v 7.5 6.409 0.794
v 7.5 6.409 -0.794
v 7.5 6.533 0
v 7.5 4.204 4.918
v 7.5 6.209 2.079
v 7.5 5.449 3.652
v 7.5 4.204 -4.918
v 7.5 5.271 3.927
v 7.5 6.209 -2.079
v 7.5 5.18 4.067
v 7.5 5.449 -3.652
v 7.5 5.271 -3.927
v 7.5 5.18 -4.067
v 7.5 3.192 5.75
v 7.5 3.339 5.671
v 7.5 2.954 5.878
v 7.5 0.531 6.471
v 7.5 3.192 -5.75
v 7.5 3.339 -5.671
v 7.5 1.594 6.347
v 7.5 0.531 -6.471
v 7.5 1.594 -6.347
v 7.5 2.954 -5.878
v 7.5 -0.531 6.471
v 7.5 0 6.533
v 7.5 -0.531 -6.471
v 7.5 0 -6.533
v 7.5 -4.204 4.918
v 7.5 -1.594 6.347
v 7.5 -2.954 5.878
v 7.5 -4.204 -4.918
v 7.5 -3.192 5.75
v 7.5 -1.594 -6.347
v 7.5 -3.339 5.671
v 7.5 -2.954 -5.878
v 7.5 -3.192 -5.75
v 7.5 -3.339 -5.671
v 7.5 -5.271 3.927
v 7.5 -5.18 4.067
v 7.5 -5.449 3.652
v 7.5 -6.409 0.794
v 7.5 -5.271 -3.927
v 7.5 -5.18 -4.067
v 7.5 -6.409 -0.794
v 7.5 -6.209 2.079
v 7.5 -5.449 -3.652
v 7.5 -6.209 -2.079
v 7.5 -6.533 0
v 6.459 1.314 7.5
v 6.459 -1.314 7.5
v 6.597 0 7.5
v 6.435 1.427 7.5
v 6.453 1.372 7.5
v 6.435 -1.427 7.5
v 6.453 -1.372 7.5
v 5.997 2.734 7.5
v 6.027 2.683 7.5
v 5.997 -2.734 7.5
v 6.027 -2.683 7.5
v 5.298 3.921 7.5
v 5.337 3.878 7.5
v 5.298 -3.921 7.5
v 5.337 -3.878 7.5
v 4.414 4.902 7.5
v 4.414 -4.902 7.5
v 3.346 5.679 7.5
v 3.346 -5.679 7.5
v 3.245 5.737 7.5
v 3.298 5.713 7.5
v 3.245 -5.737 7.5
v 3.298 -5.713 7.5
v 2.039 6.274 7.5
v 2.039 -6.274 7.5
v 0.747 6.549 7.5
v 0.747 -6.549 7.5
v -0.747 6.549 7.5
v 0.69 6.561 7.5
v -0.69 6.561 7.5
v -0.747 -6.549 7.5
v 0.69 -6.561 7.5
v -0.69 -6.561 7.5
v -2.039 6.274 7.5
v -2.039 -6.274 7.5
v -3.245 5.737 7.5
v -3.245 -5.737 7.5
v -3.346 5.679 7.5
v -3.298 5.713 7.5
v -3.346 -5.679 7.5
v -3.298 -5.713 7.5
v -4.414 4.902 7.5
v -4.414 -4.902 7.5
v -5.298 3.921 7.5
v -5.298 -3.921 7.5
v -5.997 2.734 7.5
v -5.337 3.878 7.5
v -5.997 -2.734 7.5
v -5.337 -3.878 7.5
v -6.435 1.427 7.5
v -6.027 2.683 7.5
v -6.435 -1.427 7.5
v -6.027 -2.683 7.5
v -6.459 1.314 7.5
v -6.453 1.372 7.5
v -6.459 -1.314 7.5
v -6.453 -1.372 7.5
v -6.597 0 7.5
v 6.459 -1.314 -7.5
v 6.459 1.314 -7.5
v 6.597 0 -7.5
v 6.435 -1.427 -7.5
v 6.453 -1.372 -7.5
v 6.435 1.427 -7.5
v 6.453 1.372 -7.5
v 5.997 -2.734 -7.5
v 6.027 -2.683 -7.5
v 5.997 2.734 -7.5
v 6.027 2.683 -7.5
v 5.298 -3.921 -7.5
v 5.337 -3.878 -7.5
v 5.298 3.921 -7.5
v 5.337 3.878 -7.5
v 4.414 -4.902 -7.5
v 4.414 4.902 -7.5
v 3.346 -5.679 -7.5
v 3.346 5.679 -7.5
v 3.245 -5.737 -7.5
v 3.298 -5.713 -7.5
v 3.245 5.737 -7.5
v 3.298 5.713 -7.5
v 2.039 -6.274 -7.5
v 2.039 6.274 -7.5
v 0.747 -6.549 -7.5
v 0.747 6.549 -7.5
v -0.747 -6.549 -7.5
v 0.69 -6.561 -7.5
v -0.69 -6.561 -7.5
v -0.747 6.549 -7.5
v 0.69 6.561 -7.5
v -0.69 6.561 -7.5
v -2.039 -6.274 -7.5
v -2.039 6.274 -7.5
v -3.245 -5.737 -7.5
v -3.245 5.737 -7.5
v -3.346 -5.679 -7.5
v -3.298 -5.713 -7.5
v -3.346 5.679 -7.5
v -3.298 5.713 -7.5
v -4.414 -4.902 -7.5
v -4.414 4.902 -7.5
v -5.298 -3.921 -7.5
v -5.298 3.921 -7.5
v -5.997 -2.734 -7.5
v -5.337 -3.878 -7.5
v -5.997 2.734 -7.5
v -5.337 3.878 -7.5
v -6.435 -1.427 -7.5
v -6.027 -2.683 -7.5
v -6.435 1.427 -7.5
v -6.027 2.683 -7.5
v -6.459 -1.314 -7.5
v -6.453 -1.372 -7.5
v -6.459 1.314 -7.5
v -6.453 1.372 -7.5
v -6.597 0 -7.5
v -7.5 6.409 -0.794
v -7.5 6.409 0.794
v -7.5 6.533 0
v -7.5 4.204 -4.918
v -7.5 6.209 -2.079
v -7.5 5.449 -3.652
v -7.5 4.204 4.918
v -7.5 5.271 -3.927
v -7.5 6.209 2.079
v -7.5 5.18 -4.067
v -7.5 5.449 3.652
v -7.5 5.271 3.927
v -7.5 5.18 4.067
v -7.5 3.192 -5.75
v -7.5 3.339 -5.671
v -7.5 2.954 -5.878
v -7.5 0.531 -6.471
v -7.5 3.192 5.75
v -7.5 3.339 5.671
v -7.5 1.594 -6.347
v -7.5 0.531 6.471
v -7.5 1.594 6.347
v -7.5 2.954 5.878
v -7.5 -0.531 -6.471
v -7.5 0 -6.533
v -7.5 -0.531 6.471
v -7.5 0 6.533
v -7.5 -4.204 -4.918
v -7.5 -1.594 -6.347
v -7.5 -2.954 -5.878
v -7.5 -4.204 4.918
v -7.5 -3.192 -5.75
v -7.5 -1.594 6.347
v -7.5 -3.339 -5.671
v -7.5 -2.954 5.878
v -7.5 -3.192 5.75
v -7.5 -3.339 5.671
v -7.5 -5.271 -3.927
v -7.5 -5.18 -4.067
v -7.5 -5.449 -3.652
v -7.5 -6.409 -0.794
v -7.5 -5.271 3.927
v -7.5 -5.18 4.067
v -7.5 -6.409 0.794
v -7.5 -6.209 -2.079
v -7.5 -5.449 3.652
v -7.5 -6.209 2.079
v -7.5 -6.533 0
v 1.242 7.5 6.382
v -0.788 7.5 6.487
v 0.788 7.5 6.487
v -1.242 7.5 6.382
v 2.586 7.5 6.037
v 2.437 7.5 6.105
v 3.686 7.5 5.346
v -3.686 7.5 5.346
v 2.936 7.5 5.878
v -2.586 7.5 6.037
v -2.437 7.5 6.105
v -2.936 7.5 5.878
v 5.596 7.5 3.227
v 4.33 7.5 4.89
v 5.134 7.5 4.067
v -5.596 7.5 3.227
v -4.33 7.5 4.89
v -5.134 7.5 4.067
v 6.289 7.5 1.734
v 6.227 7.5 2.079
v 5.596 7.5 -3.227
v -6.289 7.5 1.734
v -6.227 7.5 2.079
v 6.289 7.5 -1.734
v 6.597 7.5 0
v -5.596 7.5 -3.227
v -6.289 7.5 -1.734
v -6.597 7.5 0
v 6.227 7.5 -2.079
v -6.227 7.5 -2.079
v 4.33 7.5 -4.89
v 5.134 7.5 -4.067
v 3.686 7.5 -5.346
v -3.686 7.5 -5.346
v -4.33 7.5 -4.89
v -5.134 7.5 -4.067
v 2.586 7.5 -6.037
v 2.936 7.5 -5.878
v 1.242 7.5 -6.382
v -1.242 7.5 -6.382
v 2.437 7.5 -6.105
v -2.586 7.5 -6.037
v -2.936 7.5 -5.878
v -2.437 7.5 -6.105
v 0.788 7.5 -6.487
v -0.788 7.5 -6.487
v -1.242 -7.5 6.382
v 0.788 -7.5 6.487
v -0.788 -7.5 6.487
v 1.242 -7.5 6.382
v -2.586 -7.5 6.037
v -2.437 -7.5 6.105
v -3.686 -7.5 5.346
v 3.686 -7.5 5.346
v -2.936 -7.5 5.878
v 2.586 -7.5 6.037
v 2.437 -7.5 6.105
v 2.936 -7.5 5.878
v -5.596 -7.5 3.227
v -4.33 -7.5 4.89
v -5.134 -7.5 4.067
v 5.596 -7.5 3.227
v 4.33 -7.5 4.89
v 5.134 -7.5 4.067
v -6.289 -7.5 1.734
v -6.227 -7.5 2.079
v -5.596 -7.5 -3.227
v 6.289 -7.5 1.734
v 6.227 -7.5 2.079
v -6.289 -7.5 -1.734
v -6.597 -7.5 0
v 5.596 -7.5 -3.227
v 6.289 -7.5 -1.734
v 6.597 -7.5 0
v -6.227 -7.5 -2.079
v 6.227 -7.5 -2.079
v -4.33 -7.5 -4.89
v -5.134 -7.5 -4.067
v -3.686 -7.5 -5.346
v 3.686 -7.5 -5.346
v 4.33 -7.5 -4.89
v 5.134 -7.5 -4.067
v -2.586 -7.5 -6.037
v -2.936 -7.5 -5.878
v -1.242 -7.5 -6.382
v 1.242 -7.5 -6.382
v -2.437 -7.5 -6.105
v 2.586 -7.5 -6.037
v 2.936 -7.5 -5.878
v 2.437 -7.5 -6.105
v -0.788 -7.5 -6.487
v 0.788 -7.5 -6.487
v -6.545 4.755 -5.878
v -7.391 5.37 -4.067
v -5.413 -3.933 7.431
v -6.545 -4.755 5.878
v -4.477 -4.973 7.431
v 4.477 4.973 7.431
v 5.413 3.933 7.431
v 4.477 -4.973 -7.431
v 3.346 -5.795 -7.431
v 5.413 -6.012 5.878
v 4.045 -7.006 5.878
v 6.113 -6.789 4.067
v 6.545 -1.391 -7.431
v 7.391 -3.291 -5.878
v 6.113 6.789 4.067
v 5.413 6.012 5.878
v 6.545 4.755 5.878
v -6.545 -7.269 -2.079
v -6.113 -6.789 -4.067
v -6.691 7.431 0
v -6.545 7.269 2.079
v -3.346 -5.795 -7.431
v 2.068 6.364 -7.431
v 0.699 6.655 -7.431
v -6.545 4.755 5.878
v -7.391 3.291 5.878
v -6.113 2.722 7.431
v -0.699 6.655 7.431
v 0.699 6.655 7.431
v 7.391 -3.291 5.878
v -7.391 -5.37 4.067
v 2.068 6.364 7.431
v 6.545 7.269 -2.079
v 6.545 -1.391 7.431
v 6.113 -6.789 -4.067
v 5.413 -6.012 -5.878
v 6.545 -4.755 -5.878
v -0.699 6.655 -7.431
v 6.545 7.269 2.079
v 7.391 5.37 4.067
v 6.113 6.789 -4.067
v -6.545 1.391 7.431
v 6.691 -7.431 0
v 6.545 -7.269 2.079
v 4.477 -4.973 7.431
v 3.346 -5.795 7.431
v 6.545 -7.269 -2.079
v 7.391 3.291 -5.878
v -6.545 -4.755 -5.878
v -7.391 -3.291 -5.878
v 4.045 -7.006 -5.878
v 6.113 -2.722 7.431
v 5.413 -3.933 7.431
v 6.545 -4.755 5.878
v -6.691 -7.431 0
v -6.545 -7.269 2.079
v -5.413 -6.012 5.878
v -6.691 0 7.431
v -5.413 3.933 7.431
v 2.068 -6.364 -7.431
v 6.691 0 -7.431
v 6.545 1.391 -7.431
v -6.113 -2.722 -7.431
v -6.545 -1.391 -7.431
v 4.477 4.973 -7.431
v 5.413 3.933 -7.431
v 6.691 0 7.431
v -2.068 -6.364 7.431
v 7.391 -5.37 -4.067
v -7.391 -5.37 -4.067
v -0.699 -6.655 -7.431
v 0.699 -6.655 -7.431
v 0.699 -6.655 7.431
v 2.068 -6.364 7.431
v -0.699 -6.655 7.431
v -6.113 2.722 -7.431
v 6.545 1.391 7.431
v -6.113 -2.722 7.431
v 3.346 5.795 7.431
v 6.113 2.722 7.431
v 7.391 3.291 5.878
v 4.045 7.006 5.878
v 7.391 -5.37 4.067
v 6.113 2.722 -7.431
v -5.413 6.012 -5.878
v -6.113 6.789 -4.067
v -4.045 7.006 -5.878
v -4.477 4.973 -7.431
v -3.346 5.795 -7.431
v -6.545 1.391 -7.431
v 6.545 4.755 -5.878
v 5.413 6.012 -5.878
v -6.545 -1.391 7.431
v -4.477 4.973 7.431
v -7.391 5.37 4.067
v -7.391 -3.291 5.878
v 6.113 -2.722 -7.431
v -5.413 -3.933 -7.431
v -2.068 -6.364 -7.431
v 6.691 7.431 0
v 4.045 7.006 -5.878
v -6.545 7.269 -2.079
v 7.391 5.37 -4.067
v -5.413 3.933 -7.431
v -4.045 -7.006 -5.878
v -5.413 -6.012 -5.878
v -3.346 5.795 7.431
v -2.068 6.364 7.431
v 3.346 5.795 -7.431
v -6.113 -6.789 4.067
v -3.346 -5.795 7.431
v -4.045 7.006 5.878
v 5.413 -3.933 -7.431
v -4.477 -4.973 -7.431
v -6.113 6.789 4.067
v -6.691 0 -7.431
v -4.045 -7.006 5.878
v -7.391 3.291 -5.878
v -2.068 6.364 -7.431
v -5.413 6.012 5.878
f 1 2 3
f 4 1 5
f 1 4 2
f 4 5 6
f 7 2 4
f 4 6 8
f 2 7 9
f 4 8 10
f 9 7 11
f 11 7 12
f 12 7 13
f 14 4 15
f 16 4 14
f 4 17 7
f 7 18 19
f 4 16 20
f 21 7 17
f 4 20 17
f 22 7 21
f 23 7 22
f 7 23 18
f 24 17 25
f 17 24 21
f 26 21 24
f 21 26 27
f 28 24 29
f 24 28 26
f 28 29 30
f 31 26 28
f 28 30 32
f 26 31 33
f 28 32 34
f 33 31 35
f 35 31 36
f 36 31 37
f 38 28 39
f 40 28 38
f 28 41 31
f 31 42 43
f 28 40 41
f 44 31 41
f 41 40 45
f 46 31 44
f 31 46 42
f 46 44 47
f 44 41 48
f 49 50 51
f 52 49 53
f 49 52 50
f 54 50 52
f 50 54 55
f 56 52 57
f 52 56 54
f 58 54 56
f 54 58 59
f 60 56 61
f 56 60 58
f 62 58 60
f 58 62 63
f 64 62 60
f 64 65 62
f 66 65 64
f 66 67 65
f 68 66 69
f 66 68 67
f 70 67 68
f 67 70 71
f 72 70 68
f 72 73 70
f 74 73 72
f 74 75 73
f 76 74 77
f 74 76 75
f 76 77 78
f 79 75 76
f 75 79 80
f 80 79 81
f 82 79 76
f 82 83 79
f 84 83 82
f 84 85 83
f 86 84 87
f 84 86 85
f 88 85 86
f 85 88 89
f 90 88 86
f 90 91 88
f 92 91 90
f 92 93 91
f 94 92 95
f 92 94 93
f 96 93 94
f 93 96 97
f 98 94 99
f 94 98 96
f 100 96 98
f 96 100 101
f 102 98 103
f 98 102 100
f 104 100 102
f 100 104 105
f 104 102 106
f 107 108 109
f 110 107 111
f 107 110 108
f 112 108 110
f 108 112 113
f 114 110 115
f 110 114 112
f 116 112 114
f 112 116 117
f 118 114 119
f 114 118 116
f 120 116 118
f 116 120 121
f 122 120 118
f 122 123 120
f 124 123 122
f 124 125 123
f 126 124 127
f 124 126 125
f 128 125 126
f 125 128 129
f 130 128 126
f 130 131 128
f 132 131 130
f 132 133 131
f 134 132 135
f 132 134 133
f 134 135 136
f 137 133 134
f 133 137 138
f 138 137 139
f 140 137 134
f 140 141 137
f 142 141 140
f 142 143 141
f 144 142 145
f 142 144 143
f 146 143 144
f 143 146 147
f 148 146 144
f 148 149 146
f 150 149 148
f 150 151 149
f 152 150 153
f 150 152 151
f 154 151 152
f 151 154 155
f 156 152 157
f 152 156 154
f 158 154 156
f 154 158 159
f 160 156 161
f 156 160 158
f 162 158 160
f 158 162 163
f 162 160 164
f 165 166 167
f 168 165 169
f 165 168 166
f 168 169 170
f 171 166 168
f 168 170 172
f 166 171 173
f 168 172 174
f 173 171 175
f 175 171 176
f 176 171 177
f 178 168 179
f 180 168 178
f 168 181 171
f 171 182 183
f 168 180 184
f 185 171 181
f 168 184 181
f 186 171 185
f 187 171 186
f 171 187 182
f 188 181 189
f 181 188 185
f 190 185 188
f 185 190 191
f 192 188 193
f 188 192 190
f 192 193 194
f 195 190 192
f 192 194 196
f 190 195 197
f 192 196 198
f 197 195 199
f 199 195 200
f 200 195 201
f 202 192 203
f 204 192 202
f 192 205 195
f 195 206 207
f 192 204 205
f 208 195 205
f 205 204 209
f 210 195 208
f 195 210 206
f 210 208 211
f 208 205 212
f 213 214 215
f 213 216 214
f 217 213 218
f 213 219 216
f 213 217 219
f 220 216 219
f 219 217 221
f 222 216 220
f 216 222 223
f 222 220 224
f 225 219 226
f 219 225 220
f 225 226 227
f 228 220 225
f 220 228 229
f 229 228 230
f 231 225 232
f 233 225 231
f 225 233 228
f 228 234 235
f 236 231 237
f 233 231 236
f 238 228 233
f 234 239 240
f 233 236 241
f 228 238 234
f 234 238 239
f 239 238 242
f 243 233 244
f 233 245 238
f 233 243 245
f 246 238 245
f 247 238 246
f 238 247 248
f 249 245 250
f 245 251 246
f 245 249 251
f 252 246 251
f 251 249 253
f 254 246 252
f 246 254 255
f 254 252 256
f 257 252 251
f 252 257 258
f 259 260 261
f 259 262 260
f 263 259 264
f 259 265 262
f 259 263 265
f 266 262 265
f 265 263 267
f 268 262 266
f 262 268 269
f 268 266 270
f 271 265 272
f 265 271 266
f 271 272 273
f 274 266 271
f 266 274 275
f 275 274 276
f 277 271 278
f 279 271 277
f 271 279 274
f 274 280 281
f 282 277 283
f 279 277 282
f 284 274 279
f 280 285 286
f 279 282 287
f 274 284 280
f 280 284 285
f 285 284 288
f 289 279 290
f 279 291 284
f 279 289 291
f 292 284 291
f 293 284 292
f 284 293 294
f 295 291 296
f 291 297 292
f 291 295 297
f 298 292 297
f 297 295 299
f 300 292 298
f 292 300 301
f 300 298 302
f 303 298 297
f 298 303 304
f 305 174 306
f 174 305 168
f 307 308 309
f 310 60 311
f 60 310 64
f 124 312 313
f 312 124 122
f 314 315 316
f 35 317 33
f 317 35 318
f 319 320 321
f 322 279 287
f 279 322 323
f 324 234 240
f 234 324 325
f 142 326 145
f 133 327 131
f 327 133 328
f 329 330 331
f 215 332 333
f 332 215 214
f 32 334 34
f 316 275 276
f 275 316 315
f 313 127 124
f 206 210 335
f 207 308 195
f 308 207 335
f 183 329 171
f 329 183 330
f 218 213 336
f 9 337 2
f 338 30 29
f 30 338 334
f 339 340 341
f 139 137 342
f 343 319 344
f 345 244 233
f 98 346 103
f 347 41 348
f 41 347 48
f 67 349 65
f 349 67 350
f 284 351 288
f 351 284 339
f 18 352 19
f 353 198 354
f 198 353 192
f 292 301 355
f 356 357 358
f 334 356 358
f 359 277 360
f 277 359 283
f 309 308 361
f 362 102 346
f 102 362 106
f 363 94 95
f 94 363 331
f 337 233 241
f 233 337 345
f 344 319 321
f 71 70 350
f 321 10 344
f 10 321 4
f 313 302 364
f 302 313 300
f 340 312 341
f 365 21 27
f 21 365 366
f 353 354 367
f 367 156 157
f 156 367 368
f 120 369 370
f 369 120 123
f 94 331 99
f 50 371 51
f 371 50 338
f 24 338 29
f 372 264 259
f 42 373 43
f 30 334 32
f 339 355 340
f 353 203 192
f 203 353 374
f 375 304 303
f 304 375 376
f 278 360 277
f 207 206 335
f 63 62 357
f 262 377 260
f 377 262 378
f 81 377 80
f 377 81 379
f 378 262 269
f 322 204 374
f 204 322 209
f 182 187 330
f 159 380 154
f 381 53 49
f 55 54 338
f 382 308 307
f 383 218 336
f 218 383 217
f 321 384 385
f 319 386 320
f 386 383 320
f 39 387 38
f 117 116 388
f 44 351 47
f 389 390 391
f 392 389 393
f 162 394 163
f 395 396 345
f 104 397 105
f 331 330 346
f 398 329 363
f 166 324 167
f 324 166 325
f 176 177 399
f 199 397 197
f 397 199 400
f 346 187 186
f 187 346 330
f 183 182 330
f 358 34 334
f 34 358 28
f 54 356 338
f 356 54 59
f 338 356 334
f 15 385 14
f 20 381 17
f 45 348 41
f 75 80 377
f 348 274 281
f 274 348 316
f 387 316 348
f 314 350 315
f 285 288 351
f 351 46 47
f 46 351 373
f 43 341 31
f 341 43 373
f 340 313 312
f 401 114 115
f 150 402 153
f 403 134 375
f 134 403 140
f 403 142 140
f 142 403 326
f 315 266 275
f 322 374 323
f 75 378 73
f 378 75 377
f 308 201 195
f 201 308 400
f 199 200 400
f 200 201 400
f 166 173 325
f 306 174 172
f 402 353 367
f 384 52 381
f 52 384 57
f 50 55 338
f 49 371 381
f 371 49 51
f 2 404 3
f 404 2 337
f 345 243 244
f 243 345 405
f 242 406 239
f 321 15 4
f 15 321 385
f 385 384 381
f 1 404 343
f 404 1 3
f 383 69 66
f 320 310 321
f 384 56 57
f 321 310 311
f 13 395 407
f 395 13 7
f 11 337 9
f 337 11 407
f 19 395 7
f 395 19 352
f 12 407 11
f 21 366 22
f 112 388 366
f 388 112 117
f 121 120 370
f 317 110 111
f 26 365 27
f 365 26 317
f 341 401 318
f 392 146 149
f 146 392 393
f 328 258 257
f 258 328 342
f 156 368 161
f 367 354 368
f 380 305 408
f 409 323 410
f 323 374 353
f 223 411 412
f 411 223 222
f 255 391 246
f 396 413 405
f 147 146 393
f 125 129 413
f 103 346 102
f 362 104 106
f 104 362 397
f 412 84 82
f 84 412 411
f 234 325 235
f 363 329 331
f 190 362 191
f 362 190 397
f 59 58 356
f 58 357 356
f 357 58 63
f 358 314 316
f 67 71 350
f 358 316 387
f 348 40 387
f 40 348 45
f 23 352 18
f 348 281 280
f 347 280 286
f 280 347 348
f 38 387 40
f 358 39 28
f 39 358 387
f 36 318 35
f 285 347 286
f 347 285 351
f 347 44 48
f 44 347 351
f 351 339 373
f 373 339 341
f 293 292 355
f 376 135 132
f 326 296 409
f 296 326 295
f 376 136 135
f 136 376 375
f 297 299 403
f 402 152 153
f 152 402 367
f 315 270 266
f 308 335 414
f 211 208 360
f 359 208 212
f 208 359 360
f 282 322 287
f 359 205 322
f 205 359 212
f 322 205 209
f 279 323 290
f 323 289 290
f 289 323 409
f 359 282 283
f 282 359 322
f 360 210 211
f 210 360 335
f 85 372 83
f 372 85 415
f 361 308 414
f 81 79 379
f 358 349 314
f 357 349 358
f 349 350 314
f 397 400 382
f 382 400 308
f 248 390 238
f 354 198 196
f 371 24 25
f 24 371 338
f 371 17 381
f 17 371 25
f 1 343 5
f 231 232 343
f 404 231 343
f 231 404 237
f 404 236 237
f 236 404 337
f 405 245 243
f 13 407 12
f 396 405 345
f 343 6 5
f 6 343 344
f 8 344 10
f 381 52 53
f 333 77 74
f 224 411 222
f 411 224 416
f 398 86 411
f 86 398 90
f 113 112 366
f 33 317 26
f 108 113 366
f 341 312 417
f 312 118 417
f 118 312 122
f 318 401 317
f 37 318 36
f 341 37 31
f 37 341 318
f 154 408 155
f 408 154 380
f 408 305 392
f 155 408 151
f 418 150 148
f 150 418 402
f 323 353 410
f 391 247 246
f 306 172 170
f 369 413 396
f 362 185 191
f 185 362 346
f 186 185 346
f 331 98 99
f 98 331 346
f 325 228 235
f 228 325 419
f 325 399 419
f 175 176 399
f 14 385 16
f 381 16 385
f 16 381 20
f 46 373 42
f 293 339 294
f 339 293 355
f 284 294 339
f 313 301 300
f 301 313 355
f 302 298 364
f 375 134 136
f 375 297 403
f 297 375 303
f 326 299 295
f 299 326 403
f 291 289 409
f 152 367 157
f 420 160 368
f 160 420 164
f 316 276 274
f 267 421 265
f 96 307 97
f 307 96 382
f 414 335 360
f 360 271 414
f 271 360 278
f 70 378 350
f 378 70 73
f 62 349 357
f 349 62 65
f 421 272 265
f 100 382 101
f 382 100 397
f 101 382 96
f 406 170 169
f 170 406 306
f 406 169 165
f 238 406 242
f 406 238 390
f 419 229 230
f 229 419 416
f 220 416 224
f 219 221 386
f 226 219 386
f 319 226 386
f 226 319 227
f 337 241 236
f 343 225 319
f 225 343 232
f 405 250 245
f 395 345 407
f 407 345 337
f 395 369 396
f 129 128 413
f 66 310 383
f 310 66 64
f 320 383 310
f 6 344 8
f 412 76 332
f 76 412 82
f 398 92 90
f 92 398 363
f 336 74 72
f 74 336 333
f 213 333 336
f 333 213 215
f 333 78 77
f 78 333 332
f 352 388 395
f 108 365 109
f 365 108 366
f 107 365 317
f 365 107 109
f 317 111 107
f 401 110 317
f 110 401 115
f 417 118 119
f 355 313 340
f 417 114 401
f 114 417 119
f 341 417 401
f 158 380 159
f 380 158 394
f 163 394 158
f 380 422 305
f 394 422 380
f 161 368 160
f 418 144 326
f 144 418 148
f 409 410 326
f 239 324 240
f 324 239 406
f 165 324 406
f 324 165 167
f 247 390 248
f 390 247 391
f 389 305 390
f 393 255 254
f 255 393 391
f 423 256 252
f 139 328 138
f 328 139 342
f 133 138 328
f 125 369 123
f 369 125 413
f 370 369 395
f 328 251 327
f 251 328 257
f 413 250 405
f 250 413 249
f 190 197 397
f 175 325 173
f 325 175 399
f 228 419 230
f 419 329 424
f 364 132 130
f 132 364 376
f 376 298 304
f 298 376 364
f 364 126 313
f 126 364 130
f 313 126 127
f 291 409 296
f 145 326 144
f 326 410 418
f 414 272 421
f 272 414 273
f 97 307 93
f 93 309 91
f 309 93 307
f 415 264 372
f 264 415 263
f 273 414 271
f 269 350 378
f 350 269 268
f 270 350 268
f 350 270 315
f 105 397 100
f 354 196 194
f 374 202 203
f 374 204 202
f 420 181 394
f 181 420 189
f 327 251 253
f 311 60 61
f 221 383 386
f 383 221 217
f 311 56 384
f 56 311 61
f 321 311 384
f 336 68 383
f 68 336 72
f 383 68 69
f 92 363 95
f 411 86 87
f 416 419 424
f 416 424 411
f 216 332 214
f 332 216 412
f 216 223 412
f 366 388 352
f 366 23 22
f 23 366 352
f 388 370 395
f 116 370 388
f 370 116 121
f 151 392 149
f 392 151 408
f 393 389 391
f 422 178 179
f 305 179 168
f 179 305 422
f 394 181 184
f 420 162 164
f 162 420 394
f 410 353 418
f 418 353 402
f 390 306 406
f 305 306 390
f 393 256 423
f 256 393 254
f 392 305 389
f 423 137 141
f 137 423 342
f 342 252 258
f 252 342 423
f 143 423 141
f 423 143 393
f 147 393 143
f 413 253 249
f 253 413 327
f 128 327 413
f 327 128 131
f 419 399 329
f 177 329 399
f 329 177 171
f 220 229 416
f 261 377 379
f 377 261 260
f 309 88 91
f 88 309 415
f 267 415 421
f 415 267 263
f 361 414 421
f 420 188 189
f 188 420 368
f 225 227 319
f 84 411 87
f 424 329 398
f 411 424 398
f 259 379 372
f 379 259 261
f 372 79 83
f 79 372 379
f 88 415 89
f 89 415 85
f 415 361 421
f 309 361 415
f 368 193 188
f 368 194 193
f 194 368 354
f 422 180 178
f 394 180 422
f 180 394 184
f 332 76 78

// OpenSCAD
intersection() {
    cube([15, 15, 15], center = true);
    sphere(r = 10);
}
